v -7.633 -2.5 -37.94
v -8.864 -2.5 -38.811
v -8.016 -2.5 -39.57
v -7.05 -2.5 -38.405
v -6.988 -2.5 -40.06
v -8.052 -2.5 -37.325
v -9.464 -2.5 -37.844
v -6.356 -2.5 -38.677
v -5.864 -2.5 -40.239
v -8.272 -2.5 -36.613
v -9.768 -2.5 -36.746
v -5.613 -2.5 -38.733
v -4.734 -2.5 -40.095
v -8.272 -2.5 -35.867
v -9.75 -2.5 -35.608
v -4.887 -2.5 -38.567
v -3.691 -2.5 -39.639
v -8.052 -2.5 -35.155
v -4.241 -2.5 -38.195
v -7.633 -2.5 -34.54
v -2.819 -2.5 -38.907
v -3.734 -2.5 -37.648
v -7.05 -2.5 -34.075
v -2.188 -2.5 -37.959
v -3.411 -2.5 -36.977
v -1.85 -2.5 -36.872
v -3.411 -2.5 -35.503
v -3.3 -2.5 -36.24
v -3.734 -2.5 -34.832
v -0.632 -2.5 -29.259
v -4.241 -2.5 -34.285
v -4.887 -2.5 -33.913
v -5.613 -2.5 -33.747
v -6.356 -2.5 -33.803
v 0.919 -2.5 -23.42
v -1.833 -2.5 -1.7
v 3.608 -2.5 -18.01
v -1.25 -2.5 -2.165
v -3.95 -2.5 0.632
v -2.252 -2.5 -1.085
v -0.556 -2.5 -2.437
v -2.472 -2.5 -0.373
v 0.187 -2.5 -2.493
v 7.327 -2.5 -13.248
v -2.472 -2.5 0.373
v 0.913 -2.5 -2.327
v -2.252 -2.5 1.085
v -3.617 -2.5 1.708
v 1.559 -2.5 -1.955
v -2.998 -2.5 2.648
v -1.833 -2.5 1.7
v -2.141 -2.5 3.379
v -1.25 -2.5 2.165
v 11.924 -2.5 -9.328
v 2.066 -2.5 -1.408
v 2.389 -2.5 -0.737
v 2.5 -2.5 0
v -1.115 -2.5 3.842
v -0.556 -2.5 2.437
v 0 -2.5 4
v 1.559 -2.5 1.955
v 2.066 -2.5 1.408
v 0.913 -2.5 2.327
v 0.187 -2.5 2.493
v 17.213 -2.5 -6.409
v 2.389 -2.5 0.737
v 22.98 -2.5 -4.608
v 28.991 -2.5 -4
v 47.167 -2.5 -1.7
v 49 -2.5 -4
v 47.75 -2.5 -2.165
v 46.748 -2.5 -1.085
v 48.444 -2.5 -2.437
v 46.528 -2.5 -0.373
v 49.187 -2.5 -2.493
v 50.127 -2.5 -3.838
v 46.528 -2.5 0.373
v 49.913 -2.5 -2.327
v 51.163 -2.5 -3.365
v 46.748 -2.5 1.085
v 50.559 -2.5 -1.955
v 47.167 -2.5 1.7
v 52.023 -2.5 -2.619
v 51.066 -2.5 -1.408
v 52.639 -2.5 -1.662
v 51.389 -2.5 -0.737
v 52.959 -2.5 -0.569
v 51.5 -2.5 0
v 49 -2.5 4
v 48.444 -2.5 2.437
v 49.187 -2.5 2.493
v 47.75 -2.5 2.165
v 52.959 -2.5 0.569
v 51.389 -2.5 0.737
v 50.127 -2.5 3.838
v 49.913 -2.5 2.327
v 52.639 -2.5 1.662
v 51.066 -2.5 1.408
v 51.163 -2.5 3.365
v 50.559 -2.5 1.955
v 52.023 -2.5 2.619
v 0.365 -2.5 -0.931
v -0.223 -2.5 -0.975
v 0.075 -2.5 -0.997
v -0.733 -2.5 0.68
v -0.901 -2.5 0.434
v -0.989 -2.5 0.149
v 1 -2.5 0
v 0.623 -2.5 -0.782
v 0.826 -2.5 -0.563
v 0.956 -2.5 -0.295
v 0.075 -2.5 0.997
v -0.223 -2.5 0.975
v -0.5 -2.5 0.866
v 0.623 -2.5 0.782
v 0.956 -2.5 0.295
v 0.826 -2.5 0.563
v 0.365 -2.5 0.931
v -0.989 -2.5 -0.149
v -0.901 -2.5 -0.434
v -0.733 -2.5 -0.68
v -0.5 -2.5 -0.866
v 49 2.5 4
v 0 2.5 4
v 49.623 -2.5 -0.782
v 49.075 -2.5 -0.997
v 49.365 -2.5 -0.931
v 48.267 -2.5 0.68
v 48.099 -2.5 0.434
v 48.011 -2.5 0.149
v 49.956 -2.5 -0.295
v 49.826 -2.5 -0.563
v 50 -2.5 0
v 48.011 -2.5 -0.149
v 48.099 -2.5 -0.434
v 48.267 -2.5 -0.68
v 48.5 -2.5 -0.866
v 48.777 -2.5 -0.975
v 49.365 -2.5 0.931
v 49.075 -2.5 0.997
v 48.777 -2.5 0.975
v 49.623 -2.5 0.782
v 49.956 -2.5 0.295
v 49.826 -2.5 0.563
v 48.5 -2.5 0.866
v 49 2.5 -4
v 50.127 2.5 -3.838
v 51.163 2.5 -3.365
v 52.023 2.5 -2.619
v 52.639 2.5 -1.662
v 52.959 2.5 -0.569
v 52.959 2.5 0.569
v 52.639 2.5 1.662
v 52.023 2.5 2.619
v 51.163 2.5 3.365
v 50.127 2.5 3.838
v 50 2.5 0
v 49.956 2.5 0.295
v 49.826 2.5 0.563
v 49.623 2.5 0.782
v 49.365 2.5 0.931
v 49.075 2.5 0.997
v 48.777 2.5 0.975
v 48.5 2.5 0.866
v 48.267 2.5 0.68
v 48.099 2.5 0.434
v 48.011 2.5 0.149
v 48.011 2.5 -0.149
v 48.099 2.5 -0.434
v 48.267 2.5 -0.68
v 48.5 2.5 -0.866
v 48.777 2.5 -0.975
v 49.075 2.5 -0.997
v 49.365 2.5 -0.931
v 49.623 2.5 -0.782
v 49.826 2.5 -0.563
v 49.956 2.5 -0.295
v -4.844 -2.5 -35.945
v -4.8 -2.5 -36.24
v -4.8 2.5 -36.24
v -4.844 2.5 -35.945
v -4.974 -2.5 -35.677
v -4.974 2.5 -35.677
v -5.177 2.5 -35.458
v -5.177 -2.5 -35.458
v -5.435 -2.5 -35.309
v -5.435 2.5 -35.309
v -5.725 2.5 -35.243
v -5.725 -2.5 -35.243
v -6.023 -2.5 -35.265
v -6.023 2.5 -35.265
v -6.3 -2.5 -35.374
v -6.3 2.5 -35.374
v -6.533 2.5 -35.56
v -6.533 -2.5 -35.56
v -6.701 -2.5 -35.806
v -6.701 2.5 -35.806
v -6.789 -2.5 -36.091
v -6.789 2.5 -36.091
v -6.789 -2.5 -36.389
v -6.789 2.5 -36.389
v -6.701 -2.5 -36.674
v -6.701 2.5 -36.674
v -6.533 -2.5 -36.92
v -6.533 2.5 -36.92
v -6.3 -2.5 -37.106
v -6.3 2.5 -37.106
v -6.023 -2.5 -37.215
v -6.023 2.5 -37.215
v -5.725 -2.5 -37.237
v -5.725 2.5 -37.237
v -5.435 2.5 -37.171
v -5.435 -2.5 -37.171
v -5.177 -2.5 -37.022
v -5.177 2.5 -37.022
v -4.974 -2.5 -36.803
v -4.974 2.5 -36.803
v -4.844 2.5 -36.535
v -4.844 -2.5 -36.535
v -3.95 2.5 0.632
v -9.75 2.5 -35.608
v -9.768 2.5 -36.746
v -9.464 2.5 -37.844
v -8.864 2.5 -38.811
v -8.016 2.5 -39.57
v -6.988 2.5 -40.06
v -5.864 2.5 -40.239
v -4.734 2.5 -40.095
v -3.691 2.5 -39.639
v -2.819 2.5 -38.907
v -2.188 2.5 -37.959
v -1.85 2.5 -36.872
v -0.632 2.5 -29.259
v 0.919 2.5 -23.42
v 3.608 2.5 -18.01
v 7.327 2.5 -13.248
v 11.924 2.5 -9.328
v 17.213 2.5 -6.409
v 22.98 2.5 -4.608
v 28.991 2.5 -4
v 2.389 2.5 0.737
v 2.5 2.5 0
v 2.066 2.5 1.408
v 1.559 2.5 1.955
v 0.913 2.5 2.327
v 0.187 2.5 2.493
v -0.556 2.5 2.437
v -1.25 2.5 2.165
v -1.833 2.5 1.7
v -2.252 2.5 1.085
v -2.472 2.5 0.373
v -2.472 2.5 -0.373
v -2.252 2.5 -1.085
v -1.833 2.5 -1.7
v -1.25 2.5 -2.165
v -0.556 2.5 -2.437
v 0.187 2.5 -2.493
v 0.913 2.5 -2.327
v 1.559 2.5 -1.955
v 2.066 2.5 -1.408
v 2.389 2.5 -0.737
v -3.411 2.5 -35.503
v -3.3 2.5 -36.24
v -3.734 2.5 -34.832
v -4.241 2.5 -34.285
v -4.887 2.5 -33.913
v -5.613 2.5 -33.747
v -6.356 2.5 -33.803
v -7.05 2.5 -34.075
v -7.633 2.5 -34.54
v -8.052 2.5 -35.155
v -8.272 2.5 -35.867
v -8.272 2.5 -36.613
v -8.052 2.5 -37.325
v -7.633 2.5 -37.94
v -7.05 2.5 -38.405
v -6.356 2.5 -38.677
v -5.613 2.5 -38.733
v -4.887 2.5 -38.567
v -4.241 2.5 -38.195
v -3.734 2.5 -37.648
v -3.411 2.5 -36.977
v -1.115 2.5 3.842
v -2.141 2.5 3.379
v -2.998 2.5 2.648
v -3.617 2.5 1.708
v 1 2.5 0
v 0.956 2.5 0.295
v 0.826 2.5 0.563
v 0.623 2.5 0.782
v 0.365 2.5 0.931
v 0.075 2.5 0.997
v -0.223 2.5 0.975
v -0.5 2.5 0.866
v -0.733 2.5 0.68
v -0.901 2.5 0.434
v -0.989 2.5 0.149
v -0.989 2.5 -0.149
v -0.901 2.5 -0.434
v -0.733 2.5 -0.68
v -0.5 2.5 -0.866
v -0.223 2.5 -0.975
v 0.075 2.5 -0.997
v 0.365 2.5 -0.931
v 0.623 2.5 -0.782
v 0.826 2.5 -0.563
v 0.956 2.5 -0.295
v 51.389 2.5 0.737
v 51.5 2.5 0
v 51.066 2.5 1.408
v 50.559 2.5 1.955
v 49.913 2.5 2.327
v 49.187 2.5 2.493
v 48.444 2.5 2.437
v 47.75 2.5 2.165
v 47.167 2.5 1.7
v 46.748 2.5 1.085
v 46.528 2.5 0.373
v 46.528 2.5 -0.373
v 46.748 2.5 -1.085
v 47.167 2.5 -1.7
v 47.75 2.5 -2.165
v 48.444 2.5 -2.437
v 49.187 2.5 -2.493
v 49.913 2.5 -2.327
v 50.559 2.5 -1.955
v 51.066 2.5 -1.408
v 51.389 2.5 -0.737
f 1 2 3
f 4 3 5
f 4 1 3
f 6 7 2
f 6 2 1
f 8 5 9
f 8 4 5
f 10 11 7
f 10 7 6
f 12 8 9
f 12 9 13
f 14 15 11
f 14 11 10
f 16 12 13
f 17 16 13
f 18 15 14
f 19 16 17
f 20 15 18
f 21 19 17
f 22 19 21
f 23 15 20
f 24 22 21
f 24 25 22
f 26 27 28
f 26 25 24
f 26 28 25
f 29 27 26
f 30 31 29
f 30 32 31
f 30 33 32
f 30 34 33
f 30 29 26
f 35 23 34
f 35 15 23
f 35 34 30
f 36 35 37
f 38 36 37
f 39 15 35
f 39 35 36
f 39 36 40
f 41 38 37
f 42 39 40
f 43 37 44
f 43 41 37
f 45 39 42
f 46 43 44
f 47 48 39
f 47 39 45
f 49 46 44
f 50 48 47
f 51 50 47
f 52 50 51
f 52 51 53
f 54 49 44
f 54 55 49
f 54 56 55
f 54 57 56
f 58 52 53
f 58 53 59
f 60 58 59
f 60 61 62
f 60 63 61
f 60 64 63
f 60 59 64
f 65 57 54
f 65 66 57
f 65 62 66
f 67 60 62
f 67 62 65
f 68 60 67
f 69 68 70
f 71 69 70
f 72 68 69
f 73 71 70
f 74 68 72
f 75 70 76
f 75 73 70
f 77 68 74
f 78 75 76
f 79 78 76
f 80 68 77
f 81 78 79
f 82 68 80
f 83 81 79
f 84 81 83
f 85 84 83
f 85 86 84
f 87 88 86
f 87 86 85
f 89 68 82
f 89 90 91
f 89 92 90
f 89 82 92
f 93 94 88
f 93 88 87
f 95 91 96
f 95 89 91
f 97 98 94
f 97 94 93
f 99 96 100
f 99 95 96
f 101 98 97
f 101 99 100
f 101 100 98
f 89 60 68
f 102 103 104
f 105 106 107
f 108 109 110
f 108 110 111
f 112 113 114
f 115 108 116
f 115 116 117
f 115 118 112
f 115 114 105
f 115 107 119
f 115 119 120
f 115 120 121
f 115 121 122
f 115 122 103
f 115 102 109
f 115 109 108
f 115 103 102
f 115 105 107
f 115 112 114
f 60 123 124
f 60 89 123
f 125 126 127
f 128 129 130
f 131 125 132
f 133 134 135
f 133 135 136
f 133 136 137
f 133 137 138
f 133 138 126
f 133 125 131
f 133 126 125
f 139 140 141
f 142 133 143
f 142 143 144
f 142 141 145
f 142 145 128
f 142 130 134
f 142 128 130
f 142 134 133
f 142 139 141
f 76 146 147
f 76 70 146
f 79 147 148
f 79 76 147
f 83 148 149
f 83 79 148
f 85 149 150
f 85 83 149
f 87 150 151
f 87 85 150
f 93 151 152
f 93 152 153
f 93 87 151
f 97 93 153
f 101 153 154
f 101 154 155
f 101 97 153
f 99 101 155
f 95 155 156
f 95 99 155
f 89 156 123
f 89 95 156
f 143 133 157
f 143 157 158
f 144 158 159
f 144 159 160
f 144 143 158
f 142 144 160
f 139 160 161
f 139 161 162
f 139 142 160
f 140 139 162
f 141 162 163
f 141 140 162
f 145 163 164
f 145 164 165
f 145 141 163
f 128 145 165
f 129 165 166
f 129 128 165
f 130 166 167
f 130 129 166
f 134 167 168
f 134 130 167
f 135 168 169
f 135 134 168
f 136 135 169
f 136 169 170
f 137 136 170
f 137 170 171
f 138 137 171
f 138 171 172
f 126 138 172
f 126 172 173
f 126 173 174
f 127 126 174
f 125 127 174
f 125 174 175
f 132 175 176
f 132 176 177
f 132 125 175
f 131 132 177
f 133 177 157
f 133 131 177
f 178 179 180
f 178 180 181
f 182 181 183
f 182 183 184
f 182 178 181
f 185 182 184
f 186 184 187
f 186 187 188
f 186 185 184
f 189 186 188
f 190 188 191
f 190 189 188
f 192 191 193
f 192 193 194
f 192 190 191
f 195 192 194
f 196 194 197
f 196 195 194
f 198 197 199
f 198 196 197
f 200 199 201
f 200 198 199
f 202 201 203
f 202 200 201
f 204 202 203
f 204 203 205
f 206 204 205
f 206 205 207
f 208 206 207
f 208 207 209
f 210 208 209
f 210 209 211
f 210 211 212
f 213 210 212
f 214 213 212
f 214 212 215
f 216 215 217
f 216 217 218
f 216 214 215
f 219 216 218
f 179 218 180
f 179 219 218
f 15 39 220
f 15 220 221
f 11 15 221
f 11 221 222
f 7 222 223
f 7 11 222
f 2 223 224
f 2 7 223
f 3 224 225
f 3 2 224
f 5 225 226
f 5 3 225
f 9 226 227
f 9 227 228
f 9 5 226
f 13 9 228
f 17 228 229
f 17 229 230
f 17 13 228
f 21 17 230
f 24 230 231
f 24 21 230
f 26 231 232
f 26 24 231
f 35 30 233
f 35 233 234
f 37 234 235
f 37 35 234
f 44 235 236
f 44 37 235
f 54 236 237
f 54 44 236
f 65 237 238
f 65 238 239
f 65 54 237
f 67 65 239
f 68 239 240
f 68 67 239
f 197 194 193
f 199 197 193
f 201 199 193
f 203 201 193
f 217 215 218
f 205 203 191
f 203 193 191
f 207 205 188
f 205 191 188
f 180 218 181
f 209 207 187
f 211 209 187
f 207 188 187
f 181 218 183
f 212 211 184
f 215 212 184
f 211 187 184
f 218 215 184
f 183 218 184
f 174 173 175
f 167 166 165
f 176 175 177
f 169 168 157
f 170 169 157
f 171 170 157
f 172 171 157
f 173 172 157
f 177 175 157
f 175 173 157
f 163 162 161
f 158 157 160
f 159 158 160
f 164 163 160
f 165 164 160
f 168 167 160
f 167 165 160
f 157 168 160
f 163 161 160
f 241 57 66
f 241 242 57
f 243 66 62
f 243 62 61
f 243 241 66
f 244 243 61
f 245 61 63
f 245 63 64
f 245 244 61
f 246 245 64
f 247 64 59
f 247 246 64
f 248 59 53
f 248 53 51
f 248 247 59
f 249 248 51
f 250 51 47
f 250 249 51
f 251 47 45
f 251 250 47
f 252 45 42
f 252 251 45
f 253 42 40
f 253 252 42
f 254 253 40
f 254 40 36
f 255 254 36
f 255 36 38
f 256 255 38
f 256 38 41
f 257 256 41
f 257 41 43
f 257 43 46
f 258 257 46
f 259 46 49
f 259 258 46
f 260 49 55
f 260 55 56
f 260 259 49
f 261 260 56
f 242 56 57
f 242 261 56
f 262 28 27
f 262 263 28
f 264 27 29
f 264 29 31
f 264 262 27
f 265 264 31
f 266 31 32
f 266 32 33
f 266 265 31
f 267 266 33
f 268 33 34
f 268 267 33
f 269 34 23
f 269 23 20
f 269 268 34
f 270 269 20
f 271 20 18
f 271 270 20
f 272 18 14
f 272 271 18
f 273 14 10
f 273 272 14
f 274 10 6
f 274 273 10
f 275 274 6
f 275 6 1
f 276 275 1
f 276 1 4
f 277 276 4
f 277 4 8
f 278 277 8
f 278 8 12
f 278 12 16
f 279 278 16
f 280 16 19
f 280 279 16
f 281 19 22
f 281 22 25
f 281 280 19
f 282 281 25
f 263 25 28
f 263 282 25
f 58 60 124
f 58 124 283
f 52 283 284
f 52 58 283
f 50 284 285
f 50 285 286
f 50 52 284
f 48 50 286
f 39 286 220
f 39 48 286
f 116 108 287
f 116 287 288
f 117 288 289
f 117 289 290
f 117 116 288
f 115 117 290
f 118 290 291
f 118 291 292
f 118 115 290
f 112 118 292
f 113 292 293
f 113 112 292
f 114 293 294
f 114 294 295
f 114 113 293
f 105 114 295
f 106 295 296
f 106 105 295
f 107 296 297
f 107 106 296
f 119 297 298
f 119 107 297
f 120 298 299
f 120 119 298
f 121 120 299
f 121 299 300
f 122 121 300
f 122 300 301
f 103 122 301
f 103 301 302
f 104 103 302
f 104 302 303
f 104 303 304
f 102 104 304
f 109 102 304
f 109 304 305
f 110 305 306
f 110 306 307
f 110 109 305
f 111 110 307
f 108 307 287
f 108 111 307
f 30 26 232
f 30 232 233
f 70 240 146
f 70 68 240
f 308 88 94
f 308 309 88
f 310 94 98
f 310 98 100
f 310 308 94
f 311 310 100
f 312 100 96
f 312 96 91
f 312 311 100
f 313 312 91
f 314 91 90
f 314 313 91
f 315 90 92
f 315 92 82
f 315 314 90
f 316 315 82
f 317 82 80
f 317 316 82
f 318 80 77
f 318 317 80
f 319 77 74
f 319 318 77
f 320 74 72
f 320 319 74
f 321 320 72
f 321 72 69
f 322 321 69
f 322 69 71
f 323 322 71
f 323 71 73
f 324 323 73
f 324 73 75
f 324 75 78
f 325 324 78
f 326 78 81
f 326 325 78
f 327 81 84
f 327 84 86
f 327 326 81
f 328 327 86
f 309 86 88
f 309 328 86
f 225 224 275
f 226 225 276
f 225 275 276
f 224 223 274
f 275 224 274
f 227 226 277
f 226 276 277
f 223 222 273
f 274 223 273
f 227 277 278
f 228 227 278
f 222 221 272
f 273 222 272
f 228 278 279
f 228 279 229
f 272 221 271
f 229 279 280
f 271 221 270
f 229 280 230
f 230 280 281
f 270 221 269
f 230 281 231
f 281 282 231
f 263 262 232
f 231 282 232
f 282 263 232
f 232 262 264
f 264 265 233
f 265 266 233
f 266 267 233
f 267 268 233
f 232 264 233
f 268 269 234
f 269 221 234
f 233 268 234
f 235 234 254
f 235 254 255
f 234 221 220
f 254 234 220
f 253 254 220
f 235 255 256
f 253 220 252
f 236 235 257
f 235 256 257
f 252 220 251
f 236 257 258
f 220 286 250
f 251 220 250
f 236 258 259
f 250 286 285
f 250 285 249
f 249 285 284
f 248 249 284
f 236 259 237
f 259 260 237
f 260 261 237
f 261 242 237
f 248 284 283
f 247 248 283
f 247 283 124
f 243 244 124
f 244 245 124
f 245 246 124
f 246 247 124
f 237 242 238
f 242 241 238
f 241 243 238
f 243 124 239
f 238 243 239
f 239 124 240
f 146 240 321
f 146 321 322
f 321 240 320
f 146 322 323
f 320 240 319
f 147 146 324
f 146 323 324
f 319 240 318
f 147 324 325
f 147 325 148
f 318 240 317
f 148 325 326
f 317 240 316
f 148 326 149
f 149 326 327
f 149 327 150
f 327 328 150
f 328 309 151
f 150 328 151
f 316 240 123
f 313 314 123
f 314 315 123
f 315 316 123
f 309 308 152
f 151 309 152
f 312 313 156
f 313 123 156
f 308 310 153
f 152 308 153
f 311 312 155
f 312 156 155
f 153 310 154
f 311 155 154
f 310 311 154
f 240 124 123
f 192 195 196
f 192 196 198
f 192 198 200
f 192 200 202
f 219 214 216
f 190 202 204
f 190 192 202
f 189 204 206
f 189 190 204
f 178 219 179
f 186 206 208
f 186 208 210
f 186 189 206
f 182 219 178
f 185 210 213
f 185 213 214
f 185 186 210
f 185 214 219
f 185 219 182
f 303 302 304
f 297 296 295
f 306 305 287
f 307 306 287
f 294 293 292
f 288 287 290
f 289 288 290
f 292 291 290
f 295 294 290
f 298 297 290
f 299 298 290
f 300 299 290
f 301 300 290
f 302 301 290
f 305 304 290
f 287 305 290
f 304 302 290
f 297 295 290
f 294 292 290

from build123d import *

# Parameters (mm, degrees)
F0_R     = 2.5
F1_DEPTH = 2.5
F2_R     = 1
F3_DEPTH = 5


with BuildPart() as f1:
    # F0 (on Front) → F1 (new body, symmetric)
    with BuildSketch(Plane.XZ):
        with BuildLine():
            Line((49, 4), (0, 4))
            ThreePointArc((0, 4), (-2.59533, 3.043725), (-3.949735, 0.632132))
            Line((-3.949735, 0.632132), (-9.749735, -35.607868))
            ThreePointArc((-9.749735, -35.607868), (-6.432132, -40.189735), (-1.850265, -36.872132))
            Line((-1.850265, -36.872132), (-0.631829, -29.25901))
            Line((-0.631829, -29.25901), (3.410728, -4))
            Line((3.410728, -4), (28.991186, -4))
            Line((28.991186, -4), (49, -4))
            ThreePointArc((49, -4), (53, 0), (49, 4))
        make_face()
        with Locations((-5.8, -36.24)):
            Circle(F0_R, mode=Mode.SUBTRACT)
        Circle(F0_R, mode=Mode.SUBTRACT)
        with Locations((49, 0)):
            Circle(F0_R, mode=Mode.SUBTRACT)
        with BuildLine():
            ThreePointArc((-0.631829, -29.25901), (9.526214, -11.17206), (28.991186, -4))
            Line((28.991186, -4), (3.410728, -4))
            Line((3.410728, -4), (-0.631829, -29.25901))
        make_face()
    extrude(amount=F1_DEPTH, both=True)


with BuildPart() as f3:
    # F2 (on face) → F3 (new body)
    with BuildSketch(Plane.XZ.offset(2.5)):
        Circle(F2_R)
        with Locations((-5.8, -36.24)):
            Circle(F2_R)
        with Locations((49, 0)):
            Circle(F2_R)
    extrude(amount=-F3_DEPTH)


solid = Compound([f1.part, f3.part])
